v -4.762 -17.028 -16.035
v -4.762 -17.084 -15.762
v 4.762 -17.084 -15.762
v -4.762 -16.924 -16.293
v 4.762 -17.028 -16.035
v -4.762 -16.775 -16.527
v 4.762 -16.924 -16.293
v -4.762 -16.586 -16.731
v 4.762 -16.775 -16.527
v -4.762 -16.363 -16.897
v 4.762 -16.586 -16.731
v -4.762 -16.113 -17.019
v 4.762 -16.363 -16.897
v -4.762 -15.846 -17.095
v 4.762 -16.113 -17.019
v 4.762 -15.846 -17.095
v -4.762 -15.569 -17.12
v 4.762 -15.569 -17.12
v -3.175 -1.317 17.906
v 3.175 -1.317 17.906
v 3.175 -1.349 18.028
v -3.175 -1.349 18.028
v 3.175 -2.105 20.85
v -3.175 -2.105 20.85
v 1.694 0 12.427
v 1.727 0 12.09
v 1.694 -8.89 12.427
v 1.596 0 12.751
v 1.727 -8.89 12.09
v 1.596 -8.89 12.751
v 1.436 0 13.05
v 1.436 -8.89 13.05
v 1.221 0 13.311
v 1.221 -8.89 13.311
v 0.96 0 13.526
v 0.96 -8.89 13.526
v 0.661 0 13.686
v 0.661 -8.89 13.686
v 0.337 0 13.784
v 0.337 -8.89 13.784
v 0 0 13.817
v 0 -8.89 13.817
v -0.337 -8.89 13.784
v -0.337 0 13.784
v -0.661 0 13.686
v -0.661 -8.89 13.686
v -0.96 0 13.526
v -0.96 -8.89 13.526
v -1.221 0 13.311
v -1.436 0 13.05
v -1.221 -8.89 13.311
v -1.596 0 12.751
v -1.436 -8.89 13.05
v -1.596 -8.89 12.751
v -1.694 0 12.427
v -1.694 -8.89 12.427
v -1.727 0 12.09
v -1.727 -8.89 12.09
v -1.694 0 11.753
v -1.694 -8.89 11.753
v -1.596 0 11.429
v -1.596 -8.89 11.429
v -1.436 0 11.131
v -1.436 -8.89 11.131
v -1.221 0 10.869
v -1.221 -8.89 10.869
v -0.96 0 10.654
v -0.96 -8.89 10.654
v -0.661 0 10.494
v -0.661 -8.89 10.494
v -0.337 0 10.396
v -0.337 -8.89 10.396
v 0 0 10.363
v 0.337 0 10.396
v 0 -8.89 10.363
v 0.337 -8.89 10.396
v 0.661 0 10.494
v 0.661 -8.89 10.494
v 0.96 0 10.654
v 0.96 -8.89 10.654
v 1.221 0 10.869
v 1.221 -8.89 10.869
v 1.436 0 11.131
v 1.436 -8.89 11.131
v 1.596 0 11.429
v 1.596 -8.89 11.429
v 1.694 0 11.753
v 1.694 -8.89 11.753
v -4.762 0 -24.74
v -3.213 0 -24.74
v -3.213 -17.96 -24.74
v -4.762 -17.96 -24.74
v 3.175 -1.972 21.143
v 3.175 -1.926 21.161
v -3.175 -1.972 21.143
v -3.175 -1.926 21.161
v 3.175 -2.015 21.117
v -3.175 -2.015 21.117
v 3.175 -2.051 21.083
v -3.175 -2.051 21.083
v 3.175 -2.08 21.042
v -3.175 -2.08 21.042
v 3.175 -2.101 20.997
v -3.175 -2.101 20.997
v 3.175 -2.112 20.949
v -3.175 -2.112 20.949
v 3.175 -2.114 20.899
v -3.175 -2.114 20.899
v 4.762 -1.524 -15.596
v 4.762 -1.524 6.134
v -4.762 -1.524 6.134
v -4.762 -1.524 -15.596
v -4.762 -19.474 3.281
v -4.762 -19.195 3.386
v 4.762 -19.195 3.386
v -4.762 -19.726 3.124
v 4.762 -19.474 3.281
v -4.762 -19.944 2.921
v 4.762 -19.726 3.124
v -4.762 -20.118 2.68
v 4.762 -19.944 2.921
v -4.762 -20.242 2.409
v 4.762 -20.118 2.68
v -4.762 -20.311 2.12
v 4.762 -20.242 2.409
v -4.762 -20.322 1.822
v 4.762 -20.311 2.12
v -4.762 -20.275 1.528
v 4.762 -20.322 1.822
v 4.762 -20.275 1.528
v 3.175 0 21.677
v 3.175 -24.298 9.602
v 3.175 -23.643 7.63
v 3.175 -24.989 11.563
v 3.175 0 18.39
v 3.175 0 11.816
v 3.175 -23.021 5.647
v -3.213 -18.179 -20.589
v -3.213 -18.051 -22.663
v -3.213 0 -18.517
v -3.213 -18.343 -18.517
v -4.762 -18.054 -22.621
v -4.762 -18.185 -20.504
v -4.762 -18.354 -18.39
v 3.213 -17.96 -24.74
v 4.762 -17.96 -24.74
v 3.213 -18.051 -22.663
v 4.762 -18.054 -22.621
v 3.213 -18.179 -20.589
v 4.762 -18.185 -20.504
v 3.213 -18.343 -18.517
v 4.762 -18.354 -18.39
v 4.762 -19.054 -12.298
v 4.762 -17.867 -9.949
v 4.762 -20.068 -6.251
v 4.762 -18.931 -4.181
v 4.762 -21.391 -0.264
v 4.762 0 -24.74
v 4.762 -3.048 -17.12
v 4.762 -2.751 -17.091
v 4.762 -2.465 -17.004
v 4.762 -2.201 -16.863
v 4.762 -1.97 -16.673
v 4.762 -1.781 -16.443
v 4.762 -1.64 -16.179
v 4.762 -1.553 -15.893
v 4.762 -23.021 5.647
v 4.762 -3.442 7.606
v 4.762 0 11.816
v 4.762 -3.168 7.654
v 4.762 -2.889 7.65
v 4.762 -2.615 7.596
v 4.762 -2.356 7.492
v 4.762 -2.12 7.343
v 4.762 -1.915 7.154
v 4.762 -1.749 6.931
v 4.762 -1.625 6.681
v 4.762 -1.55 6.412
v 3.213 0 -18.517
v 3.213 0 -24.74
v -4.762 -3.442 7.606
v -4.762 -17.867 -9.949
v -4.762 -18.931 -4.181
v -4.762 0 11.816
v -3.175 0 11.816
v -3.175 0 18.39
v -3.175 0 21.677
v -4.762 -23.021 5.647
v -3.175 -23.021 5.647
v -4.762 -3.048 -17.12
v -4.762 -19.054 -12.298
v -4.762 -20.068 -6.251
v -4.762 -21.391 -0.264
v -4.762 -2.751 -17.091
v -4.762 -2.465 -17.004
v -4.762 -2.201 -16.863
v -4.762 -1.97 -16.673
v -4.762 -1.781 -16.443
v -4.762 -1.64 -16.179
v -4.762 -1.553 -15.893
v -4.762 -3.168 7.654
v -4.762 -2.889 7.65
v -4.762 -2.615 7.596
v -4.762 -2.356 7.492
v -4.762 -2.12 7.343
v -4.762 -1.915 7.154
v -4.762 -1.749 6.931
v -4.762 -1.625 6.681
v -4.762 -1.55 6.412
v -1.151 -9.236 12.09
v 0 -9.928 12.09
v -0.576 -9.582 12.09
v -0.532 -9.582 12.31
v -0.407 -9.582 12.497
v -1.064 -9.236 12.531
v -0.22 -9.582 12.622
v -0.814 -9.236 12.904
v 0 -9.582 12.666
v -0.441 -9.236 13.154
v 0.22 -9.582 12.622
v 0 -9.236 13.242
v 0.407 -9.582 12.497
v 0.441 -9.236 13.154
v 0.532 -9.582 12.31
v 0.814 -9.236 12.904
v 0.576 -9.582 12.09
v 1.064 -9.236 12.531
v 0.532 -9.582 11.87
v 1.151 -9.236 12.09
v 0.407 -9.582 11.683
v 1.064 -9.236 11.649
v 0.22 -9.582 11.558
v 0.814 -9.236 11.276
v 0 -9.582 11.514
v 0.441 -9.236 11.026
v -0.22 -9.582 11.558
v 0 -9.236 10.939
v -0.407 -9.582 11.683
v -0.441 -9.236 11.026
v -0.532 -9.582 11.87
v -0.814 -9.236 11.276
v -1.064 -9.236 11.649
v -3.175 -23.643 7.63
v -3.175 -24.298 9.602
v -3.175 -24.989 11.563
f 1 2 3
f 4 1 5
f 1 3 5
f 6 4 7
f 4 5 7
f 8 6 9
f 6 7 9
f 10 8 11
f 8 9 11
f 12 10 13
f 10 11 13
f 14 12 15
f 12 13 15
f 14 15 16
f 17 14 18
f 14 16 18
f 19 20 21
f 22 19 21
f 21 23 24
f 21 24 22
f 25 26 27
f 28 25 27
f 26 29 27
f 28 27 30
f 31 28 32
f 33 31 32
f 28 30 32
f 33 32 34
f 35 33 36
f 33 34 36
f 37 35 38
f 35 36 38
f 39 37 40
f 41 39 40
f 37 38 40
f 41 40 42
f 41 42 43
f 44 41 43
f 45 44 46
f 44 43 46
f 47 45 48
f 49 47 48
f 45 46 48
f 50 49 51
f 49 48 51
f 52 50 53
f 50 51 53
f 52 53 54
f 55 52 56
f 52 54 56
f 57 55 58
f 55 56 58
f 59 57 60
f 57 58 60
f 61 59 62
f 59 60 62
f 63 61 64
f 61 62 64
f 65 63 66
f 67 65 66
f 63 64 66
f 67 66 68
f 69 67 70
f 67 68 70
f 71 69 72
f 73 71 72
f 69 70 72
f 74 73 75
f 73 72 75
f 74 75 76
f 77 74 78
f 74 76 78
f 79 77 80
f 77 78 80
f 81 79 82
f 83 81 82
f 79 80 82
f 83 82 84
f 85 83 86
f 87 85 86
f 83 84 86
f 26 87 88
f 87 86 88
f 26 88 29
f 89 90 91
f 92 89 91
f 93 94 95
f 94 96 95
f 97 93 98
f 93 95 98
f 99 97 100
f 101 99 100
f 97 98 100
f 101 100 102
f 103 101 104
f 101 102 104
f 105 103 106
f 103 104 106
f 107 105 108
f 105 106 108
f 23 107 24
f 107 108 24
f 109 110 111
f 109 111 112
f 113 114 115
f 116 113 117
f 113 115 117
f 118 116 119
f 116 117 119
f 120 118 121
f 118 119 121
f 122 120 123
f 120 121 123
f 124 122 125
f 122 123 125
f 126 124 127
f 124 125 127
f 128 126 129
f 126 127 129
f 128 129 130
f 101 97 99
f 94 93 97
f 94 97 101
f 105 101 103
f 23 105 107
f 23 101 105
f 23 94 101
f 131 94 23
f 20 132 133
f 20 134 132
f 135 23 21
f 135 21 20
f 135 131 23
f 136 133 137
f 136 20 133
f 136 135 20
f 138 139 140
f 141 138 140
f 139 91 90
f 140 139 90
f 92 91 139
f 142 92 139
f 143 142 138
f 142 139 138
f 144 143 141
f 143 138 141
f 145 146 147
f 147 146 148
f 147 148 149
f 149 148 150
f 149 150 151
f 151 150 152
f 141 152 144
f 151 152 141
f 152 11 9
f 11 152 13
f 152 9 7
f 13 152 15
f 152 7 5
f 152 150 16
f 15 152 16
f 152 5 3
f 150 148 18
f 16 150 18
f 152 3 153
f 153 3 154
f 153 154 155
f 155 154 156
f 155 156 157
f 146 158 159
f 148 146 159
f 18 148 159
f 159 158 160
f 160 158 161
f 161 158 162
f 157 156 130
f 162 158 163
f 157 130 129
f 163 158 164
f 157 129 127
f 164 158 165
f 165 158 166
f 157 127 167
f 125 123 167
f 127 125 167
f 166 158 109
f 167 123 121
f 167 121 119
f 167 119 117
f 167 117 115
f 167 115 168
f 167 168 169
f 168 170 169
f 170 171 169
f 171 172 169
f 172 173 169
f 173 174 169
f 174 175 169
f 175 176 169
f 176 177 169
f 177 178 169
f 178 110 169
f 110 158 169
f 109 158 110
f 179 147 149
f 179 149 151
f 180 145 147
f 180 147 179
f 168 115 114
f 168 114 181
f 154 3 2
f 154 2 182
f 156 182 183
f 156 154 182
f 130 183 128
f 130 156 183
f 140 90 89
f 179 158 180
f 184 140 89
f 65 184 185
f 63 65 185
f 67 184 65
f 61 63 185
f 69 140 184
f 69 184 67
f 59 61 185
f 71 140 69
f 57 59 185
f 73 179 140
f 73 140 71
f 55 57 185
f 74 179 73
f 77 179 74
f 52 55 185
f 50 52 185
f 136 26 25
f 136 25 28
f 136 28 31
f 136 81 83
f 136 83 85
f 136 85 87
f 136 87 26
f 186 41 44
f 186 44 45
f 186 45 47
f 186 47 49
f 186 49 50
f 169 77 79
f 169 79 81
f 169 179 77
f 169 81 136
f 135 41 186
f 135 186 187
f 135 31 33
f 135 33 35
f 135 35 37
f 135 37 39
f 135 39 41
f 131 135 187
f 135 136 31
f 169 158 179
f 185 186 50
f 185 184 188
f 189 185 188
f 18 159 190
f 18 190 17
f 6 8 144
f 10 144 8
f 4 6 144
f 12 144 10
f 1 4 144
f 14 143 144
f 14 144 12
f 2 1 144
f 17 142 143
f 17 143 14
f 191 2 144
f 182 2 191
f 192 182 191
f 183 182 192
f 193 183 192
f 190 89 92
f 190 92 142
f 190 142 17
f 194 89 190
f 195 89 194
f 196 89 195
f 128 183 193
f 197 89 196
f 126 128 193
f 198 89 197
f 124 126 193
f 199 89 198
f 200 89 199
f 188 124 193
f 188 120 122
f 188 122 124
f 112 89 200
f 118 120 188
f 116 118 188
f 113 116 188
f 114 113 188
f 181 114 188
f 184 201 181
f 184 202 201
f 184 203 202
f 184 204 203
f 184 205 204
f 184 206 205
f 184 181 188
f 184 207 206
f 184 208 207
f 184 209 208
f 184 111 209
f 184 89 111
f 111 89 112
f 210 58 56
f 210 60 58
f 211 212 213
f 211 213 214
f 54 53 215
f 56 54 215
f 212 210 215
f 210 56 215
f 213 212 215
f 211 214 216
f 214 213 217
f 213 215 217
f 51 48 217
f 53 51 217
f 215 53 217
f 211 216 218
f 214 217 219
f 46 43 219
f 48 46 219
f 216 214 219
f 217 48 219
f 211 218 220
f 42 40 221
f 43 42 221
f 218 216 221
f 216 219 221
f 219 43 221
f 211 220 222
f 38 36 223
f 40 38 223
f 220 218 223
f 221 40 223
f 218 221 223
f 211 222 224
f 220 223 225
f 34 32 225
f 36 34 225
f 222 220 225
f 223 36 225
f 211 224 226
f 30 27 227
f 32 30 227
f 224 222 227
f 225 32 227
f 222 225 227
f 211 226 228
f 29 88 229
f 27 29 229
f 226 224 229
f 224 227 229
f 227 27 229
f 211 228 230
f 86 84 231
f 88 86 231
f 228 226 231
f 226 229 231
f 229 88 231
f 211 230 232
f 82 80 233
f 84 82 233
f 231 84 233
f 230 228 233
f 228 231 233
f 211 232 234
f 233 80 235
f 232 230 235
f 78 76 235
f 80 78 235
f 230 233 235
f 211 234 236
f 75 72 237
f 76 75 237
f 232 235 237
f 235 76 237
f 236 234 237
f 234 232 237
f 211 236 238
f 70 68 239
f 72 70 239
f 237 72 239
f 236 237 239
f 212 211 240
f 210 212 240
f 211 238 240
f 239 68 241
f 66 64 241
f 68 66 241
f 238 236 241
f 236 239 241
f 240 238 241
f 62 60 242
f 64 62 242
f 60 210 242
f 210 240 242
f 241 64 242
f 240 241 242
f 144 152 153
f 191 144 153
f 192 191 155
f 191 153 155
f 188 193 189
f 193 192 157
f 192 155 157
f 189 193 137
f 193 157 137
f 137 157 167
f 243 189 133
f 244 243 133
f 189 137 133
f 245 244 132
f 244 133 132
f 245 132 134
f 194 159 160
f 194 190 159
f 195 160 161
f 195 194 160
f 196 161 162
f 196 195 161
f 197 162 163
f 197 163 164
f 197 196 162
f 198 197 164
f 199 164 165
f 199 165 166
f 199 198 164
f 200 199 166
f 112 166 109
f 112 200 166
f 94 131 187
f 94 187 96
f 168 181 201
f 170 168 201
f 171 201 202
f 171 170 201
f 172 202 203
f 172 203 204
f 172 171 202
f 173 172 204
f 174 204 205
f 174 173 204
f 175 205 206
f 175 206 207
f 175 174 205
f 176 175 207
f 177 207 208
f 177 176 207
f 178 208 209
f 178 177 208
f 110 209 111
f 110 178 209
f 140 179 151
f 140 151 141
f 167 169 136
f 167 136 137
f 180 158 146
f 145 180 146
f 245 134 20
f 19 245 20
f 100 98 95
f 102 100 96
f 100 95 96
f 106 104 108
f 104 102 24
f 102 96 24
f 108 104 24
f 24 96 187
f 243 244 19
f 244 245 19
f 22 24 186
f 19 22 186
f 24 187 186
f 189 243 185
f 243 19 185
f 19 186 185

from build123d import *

# Parameters (mm, degrees)
BOSS_EXTRUDE1_DEPTH       = 4.7625
F_8_32_TAPPED_HOLE1_D     = 3.4544
F_8_32_TAPPED_HOLE1_DEPTH = 8.89
F_8_32_TAPPED_HOLE1_TIP   = 1.037806461
BOSS_EXTRUDE2_DEPTH       = 9.525
SKETCH5_W                 = 6.4262
SKETCH5_H                 = 22.225
CUT_EXTRUDE1_DEPTH        = 6.223
CUT_EXTRUDE2_DEPTH        = 1.5875
CUT_EXTRUDE4_DEPTH        = 5.7625
CUT_EXTRUDE4_DEPTH_BACK   = 5.7625
FILLET1_R                 = 1.524
BOSS_EXTRUDE3_DEPTH       = 6.35
FILLET2_R                 = 0.254
CUT_EXTRUDE5_DEPTH        = 8.9375


with BuildPart() as part:
    # Sketch1 → Boss-Extrude1 (new body, symmetric)
    with BuildSketch(Plane(origin=(0, 0, 0), x_dir=(0, 0, -1), z_dir=(1, 0, 0))):
        with BuildLine():
            Line((-18.389854, 0), (18.389854, 0))
            Line((18.389854, 0), (18.389854, -18.35404))
            ThreePointArc((18.389854, -18.35404), (3.13664885, -20.715801882), (-11.682560966, -25.031958383))
            Line((-11.682560966, -25.031958383), (-18.389854, 0))
        make_face()
    extrude(amount=BOSS_EXTRUDE1_DEPTH, both=True)

    # #8-32 Tapped Hole1
    with Locations(Plane(origin=(0, 0, 0), x_dir=(-1, 0, 0), z_dir=(0, 1, 0))):
        with Locations((0, 12.090146)):
            Hole(F_8_32_TAPPED_HOLE1_D / 2, depth=F_8_32_TAPPED_HOLE1_DEPTH)
            with Locations((0, 0, -(F_8_32_TAPPED_HOLE1_DEPTH + F_8_32_TAPPED_HOLE1_TIP / 2))):  # 118° drill point
                Cone(0, F_8_32_TAPPED_HOLE1_D / 2, F_8_32_TAPPED_HOLE1_TIP, mode=Mode.SUBTRACT)

    # Sketch4 → Boss-Extrude2 (add)
    with BuildSketch(Plane(origin=(4.7625, 0, 0), x_dir=(0, 0, -1), z_dir=(1, 0, 0))):
        with BuildLine():
            Line((18.389854, 0), (24.739854, 0))
            Line((24.739854, 0), (24.739854, -17.95993887))
            ThreePointArc((24.739854, -17.95993887), (21.562219751, -18.114544788), (18.389854, -18.35404))
            Line((18.389854, -18.35404), (18.389854, 0))
        make_face()
    extrude(amount=-BOSS_EXTRUDE2_DEPTH)

    # Sketch5 → Cut-Extrude1 (cut)
    with BuildSketch(Plane(origin=(0, 0, -24.739854), x_dir=(-1, 0, 0), z_dir=(0, 0, -1))):
        with Locations((0, -11.1125)):
            Rectangle(SKETCH5_W, SKETCH5_H)
    extrude(amount=-CUT_EXTRUDE1_DEPTH, mode=Mode.SUBTRACT)

    # Sketch6 → Cut-Extrude2 (cut)
    with BuildSketch(Plane(origin=(4.7625, -3.455581552, 12.676714301), x_dir=(0, -0.262996683, 0.964796738), z_dir=(-1, 0, 0))):
        with BuildLine():
            Line((4.603212059, 4.836470596), (-1.739365308, 3.107529419))
            Line((-1.739365308, 3.107529419), (-1.636225637, -20.725696455))
            ThreePointArc((-1.636225637, -20.725696455), (1.5419234, -20.859537189), (4.715359636, -21.078277005))
            Line((4.715359636, -21.078277005), (4.603212059, 4.836470596))
        make_face()
    cut_extrude2 = extrude(amount=CUT_EXTRUDE2_DEPTH, mode=Mode.SUBTRACT)

    # Mirror1: Cut-Extrude2 across plane
    add(cut_extrude2.mirror(Plane(origin=(0, 0, 0), x_dir=(0, 0, 1), z_dir=(1, 0, 0))), mode=Mode.SUBTRACT)

    # Sketch8 → Cut-Extrude4 (cut, two sides)
    with BuildSketch(Plane(origin=(0, 0, 0), x_dir=(0, 0, -1), z_dir=(1, 0, 0))) as cut_extrude4_sk:
        with BuildLine():
            Line((-8.120493812, -1.524), (17.119854, -1.524))
            Line((17.119854, -1.524), (17.119854, -16.942404249))
            ThreePointArc((17.119854, -16.942404249), (6.985210432, -18.377350774), (-2.991129125, -20.667049623))
            Line((-2.991129125, -20.667049623), (-8.120493812, -1.524))
        make_face()
    extrude(amount=CUT_EXTRUDE4_DEPTH, mode=Mode.SUBTRACT)
    extrude(cut_extrude4_sk.sketch, amount=-CUT_EXTRUDE4_DEPTH_BACK, mode=Mode.SUBTRACT)

    # Fillet1
    fillet1_edges = [part.edges().sort_by_distance(p)[0] for p in [
        (0, -20.667049623, 2.991129125),
        (0, -1.524, 8.120493812),
        (0, -1.524, -17.119854),
        (0, -16.942404249, -17.119854),
    ]]
    fillet(fillet1_edges, radius=FILLET1_R)

    # Sketch9 → Boss-Extrude3 (add)
    with BuildSketch(Plane(origin=(3.175, 0, 0), x_dir=(0, 0, -1), z_dir=(1, 0, 0))):
        Polygon((-18.389854, 0), (-21.676855873, 0), (-21.095098292, -2.171148848), (-18.028283794, -1.349398379), align=None)
    extrude(amount=-BOSS_EXTRUDE3_DEPTH)

    # Fillet2
    fillet2_edges = [part.edges().sort_by_distance(p)[0] for p in [
        (0, -2.171148848, 21.095098292),
    ]]
    fillet(fillet2_edges, radius=FILLET2_R)

    # Sketch13 → Cut-Extrude5 (cut, through all)
    with BuildSketch(Plane(origin=(3.175, 0, 0), x_dir=(0, 0, -1), z_dir=(1, 0, 0))):
        with BuildLine():
            Line((-17.905611214, -1.316528361), (-18.028283794, -1.349398379))
            Line((-18.028283794, -1.349398379), (-11.682560966, -25.031958383))
            ThreePointArc((-11.682560966, -25.031958383), (-11.622647023, -25.010220768), (-11.562721445, -24.988515246))
            Line((-11.562721445, -24.988515246), (-17.905611214, -1.316528361))
        make_face()
    extrude(amount=-CUT_EXTRUDE5_DEPTH, mode=Mode.SUBTRACT)


solid = part.part
